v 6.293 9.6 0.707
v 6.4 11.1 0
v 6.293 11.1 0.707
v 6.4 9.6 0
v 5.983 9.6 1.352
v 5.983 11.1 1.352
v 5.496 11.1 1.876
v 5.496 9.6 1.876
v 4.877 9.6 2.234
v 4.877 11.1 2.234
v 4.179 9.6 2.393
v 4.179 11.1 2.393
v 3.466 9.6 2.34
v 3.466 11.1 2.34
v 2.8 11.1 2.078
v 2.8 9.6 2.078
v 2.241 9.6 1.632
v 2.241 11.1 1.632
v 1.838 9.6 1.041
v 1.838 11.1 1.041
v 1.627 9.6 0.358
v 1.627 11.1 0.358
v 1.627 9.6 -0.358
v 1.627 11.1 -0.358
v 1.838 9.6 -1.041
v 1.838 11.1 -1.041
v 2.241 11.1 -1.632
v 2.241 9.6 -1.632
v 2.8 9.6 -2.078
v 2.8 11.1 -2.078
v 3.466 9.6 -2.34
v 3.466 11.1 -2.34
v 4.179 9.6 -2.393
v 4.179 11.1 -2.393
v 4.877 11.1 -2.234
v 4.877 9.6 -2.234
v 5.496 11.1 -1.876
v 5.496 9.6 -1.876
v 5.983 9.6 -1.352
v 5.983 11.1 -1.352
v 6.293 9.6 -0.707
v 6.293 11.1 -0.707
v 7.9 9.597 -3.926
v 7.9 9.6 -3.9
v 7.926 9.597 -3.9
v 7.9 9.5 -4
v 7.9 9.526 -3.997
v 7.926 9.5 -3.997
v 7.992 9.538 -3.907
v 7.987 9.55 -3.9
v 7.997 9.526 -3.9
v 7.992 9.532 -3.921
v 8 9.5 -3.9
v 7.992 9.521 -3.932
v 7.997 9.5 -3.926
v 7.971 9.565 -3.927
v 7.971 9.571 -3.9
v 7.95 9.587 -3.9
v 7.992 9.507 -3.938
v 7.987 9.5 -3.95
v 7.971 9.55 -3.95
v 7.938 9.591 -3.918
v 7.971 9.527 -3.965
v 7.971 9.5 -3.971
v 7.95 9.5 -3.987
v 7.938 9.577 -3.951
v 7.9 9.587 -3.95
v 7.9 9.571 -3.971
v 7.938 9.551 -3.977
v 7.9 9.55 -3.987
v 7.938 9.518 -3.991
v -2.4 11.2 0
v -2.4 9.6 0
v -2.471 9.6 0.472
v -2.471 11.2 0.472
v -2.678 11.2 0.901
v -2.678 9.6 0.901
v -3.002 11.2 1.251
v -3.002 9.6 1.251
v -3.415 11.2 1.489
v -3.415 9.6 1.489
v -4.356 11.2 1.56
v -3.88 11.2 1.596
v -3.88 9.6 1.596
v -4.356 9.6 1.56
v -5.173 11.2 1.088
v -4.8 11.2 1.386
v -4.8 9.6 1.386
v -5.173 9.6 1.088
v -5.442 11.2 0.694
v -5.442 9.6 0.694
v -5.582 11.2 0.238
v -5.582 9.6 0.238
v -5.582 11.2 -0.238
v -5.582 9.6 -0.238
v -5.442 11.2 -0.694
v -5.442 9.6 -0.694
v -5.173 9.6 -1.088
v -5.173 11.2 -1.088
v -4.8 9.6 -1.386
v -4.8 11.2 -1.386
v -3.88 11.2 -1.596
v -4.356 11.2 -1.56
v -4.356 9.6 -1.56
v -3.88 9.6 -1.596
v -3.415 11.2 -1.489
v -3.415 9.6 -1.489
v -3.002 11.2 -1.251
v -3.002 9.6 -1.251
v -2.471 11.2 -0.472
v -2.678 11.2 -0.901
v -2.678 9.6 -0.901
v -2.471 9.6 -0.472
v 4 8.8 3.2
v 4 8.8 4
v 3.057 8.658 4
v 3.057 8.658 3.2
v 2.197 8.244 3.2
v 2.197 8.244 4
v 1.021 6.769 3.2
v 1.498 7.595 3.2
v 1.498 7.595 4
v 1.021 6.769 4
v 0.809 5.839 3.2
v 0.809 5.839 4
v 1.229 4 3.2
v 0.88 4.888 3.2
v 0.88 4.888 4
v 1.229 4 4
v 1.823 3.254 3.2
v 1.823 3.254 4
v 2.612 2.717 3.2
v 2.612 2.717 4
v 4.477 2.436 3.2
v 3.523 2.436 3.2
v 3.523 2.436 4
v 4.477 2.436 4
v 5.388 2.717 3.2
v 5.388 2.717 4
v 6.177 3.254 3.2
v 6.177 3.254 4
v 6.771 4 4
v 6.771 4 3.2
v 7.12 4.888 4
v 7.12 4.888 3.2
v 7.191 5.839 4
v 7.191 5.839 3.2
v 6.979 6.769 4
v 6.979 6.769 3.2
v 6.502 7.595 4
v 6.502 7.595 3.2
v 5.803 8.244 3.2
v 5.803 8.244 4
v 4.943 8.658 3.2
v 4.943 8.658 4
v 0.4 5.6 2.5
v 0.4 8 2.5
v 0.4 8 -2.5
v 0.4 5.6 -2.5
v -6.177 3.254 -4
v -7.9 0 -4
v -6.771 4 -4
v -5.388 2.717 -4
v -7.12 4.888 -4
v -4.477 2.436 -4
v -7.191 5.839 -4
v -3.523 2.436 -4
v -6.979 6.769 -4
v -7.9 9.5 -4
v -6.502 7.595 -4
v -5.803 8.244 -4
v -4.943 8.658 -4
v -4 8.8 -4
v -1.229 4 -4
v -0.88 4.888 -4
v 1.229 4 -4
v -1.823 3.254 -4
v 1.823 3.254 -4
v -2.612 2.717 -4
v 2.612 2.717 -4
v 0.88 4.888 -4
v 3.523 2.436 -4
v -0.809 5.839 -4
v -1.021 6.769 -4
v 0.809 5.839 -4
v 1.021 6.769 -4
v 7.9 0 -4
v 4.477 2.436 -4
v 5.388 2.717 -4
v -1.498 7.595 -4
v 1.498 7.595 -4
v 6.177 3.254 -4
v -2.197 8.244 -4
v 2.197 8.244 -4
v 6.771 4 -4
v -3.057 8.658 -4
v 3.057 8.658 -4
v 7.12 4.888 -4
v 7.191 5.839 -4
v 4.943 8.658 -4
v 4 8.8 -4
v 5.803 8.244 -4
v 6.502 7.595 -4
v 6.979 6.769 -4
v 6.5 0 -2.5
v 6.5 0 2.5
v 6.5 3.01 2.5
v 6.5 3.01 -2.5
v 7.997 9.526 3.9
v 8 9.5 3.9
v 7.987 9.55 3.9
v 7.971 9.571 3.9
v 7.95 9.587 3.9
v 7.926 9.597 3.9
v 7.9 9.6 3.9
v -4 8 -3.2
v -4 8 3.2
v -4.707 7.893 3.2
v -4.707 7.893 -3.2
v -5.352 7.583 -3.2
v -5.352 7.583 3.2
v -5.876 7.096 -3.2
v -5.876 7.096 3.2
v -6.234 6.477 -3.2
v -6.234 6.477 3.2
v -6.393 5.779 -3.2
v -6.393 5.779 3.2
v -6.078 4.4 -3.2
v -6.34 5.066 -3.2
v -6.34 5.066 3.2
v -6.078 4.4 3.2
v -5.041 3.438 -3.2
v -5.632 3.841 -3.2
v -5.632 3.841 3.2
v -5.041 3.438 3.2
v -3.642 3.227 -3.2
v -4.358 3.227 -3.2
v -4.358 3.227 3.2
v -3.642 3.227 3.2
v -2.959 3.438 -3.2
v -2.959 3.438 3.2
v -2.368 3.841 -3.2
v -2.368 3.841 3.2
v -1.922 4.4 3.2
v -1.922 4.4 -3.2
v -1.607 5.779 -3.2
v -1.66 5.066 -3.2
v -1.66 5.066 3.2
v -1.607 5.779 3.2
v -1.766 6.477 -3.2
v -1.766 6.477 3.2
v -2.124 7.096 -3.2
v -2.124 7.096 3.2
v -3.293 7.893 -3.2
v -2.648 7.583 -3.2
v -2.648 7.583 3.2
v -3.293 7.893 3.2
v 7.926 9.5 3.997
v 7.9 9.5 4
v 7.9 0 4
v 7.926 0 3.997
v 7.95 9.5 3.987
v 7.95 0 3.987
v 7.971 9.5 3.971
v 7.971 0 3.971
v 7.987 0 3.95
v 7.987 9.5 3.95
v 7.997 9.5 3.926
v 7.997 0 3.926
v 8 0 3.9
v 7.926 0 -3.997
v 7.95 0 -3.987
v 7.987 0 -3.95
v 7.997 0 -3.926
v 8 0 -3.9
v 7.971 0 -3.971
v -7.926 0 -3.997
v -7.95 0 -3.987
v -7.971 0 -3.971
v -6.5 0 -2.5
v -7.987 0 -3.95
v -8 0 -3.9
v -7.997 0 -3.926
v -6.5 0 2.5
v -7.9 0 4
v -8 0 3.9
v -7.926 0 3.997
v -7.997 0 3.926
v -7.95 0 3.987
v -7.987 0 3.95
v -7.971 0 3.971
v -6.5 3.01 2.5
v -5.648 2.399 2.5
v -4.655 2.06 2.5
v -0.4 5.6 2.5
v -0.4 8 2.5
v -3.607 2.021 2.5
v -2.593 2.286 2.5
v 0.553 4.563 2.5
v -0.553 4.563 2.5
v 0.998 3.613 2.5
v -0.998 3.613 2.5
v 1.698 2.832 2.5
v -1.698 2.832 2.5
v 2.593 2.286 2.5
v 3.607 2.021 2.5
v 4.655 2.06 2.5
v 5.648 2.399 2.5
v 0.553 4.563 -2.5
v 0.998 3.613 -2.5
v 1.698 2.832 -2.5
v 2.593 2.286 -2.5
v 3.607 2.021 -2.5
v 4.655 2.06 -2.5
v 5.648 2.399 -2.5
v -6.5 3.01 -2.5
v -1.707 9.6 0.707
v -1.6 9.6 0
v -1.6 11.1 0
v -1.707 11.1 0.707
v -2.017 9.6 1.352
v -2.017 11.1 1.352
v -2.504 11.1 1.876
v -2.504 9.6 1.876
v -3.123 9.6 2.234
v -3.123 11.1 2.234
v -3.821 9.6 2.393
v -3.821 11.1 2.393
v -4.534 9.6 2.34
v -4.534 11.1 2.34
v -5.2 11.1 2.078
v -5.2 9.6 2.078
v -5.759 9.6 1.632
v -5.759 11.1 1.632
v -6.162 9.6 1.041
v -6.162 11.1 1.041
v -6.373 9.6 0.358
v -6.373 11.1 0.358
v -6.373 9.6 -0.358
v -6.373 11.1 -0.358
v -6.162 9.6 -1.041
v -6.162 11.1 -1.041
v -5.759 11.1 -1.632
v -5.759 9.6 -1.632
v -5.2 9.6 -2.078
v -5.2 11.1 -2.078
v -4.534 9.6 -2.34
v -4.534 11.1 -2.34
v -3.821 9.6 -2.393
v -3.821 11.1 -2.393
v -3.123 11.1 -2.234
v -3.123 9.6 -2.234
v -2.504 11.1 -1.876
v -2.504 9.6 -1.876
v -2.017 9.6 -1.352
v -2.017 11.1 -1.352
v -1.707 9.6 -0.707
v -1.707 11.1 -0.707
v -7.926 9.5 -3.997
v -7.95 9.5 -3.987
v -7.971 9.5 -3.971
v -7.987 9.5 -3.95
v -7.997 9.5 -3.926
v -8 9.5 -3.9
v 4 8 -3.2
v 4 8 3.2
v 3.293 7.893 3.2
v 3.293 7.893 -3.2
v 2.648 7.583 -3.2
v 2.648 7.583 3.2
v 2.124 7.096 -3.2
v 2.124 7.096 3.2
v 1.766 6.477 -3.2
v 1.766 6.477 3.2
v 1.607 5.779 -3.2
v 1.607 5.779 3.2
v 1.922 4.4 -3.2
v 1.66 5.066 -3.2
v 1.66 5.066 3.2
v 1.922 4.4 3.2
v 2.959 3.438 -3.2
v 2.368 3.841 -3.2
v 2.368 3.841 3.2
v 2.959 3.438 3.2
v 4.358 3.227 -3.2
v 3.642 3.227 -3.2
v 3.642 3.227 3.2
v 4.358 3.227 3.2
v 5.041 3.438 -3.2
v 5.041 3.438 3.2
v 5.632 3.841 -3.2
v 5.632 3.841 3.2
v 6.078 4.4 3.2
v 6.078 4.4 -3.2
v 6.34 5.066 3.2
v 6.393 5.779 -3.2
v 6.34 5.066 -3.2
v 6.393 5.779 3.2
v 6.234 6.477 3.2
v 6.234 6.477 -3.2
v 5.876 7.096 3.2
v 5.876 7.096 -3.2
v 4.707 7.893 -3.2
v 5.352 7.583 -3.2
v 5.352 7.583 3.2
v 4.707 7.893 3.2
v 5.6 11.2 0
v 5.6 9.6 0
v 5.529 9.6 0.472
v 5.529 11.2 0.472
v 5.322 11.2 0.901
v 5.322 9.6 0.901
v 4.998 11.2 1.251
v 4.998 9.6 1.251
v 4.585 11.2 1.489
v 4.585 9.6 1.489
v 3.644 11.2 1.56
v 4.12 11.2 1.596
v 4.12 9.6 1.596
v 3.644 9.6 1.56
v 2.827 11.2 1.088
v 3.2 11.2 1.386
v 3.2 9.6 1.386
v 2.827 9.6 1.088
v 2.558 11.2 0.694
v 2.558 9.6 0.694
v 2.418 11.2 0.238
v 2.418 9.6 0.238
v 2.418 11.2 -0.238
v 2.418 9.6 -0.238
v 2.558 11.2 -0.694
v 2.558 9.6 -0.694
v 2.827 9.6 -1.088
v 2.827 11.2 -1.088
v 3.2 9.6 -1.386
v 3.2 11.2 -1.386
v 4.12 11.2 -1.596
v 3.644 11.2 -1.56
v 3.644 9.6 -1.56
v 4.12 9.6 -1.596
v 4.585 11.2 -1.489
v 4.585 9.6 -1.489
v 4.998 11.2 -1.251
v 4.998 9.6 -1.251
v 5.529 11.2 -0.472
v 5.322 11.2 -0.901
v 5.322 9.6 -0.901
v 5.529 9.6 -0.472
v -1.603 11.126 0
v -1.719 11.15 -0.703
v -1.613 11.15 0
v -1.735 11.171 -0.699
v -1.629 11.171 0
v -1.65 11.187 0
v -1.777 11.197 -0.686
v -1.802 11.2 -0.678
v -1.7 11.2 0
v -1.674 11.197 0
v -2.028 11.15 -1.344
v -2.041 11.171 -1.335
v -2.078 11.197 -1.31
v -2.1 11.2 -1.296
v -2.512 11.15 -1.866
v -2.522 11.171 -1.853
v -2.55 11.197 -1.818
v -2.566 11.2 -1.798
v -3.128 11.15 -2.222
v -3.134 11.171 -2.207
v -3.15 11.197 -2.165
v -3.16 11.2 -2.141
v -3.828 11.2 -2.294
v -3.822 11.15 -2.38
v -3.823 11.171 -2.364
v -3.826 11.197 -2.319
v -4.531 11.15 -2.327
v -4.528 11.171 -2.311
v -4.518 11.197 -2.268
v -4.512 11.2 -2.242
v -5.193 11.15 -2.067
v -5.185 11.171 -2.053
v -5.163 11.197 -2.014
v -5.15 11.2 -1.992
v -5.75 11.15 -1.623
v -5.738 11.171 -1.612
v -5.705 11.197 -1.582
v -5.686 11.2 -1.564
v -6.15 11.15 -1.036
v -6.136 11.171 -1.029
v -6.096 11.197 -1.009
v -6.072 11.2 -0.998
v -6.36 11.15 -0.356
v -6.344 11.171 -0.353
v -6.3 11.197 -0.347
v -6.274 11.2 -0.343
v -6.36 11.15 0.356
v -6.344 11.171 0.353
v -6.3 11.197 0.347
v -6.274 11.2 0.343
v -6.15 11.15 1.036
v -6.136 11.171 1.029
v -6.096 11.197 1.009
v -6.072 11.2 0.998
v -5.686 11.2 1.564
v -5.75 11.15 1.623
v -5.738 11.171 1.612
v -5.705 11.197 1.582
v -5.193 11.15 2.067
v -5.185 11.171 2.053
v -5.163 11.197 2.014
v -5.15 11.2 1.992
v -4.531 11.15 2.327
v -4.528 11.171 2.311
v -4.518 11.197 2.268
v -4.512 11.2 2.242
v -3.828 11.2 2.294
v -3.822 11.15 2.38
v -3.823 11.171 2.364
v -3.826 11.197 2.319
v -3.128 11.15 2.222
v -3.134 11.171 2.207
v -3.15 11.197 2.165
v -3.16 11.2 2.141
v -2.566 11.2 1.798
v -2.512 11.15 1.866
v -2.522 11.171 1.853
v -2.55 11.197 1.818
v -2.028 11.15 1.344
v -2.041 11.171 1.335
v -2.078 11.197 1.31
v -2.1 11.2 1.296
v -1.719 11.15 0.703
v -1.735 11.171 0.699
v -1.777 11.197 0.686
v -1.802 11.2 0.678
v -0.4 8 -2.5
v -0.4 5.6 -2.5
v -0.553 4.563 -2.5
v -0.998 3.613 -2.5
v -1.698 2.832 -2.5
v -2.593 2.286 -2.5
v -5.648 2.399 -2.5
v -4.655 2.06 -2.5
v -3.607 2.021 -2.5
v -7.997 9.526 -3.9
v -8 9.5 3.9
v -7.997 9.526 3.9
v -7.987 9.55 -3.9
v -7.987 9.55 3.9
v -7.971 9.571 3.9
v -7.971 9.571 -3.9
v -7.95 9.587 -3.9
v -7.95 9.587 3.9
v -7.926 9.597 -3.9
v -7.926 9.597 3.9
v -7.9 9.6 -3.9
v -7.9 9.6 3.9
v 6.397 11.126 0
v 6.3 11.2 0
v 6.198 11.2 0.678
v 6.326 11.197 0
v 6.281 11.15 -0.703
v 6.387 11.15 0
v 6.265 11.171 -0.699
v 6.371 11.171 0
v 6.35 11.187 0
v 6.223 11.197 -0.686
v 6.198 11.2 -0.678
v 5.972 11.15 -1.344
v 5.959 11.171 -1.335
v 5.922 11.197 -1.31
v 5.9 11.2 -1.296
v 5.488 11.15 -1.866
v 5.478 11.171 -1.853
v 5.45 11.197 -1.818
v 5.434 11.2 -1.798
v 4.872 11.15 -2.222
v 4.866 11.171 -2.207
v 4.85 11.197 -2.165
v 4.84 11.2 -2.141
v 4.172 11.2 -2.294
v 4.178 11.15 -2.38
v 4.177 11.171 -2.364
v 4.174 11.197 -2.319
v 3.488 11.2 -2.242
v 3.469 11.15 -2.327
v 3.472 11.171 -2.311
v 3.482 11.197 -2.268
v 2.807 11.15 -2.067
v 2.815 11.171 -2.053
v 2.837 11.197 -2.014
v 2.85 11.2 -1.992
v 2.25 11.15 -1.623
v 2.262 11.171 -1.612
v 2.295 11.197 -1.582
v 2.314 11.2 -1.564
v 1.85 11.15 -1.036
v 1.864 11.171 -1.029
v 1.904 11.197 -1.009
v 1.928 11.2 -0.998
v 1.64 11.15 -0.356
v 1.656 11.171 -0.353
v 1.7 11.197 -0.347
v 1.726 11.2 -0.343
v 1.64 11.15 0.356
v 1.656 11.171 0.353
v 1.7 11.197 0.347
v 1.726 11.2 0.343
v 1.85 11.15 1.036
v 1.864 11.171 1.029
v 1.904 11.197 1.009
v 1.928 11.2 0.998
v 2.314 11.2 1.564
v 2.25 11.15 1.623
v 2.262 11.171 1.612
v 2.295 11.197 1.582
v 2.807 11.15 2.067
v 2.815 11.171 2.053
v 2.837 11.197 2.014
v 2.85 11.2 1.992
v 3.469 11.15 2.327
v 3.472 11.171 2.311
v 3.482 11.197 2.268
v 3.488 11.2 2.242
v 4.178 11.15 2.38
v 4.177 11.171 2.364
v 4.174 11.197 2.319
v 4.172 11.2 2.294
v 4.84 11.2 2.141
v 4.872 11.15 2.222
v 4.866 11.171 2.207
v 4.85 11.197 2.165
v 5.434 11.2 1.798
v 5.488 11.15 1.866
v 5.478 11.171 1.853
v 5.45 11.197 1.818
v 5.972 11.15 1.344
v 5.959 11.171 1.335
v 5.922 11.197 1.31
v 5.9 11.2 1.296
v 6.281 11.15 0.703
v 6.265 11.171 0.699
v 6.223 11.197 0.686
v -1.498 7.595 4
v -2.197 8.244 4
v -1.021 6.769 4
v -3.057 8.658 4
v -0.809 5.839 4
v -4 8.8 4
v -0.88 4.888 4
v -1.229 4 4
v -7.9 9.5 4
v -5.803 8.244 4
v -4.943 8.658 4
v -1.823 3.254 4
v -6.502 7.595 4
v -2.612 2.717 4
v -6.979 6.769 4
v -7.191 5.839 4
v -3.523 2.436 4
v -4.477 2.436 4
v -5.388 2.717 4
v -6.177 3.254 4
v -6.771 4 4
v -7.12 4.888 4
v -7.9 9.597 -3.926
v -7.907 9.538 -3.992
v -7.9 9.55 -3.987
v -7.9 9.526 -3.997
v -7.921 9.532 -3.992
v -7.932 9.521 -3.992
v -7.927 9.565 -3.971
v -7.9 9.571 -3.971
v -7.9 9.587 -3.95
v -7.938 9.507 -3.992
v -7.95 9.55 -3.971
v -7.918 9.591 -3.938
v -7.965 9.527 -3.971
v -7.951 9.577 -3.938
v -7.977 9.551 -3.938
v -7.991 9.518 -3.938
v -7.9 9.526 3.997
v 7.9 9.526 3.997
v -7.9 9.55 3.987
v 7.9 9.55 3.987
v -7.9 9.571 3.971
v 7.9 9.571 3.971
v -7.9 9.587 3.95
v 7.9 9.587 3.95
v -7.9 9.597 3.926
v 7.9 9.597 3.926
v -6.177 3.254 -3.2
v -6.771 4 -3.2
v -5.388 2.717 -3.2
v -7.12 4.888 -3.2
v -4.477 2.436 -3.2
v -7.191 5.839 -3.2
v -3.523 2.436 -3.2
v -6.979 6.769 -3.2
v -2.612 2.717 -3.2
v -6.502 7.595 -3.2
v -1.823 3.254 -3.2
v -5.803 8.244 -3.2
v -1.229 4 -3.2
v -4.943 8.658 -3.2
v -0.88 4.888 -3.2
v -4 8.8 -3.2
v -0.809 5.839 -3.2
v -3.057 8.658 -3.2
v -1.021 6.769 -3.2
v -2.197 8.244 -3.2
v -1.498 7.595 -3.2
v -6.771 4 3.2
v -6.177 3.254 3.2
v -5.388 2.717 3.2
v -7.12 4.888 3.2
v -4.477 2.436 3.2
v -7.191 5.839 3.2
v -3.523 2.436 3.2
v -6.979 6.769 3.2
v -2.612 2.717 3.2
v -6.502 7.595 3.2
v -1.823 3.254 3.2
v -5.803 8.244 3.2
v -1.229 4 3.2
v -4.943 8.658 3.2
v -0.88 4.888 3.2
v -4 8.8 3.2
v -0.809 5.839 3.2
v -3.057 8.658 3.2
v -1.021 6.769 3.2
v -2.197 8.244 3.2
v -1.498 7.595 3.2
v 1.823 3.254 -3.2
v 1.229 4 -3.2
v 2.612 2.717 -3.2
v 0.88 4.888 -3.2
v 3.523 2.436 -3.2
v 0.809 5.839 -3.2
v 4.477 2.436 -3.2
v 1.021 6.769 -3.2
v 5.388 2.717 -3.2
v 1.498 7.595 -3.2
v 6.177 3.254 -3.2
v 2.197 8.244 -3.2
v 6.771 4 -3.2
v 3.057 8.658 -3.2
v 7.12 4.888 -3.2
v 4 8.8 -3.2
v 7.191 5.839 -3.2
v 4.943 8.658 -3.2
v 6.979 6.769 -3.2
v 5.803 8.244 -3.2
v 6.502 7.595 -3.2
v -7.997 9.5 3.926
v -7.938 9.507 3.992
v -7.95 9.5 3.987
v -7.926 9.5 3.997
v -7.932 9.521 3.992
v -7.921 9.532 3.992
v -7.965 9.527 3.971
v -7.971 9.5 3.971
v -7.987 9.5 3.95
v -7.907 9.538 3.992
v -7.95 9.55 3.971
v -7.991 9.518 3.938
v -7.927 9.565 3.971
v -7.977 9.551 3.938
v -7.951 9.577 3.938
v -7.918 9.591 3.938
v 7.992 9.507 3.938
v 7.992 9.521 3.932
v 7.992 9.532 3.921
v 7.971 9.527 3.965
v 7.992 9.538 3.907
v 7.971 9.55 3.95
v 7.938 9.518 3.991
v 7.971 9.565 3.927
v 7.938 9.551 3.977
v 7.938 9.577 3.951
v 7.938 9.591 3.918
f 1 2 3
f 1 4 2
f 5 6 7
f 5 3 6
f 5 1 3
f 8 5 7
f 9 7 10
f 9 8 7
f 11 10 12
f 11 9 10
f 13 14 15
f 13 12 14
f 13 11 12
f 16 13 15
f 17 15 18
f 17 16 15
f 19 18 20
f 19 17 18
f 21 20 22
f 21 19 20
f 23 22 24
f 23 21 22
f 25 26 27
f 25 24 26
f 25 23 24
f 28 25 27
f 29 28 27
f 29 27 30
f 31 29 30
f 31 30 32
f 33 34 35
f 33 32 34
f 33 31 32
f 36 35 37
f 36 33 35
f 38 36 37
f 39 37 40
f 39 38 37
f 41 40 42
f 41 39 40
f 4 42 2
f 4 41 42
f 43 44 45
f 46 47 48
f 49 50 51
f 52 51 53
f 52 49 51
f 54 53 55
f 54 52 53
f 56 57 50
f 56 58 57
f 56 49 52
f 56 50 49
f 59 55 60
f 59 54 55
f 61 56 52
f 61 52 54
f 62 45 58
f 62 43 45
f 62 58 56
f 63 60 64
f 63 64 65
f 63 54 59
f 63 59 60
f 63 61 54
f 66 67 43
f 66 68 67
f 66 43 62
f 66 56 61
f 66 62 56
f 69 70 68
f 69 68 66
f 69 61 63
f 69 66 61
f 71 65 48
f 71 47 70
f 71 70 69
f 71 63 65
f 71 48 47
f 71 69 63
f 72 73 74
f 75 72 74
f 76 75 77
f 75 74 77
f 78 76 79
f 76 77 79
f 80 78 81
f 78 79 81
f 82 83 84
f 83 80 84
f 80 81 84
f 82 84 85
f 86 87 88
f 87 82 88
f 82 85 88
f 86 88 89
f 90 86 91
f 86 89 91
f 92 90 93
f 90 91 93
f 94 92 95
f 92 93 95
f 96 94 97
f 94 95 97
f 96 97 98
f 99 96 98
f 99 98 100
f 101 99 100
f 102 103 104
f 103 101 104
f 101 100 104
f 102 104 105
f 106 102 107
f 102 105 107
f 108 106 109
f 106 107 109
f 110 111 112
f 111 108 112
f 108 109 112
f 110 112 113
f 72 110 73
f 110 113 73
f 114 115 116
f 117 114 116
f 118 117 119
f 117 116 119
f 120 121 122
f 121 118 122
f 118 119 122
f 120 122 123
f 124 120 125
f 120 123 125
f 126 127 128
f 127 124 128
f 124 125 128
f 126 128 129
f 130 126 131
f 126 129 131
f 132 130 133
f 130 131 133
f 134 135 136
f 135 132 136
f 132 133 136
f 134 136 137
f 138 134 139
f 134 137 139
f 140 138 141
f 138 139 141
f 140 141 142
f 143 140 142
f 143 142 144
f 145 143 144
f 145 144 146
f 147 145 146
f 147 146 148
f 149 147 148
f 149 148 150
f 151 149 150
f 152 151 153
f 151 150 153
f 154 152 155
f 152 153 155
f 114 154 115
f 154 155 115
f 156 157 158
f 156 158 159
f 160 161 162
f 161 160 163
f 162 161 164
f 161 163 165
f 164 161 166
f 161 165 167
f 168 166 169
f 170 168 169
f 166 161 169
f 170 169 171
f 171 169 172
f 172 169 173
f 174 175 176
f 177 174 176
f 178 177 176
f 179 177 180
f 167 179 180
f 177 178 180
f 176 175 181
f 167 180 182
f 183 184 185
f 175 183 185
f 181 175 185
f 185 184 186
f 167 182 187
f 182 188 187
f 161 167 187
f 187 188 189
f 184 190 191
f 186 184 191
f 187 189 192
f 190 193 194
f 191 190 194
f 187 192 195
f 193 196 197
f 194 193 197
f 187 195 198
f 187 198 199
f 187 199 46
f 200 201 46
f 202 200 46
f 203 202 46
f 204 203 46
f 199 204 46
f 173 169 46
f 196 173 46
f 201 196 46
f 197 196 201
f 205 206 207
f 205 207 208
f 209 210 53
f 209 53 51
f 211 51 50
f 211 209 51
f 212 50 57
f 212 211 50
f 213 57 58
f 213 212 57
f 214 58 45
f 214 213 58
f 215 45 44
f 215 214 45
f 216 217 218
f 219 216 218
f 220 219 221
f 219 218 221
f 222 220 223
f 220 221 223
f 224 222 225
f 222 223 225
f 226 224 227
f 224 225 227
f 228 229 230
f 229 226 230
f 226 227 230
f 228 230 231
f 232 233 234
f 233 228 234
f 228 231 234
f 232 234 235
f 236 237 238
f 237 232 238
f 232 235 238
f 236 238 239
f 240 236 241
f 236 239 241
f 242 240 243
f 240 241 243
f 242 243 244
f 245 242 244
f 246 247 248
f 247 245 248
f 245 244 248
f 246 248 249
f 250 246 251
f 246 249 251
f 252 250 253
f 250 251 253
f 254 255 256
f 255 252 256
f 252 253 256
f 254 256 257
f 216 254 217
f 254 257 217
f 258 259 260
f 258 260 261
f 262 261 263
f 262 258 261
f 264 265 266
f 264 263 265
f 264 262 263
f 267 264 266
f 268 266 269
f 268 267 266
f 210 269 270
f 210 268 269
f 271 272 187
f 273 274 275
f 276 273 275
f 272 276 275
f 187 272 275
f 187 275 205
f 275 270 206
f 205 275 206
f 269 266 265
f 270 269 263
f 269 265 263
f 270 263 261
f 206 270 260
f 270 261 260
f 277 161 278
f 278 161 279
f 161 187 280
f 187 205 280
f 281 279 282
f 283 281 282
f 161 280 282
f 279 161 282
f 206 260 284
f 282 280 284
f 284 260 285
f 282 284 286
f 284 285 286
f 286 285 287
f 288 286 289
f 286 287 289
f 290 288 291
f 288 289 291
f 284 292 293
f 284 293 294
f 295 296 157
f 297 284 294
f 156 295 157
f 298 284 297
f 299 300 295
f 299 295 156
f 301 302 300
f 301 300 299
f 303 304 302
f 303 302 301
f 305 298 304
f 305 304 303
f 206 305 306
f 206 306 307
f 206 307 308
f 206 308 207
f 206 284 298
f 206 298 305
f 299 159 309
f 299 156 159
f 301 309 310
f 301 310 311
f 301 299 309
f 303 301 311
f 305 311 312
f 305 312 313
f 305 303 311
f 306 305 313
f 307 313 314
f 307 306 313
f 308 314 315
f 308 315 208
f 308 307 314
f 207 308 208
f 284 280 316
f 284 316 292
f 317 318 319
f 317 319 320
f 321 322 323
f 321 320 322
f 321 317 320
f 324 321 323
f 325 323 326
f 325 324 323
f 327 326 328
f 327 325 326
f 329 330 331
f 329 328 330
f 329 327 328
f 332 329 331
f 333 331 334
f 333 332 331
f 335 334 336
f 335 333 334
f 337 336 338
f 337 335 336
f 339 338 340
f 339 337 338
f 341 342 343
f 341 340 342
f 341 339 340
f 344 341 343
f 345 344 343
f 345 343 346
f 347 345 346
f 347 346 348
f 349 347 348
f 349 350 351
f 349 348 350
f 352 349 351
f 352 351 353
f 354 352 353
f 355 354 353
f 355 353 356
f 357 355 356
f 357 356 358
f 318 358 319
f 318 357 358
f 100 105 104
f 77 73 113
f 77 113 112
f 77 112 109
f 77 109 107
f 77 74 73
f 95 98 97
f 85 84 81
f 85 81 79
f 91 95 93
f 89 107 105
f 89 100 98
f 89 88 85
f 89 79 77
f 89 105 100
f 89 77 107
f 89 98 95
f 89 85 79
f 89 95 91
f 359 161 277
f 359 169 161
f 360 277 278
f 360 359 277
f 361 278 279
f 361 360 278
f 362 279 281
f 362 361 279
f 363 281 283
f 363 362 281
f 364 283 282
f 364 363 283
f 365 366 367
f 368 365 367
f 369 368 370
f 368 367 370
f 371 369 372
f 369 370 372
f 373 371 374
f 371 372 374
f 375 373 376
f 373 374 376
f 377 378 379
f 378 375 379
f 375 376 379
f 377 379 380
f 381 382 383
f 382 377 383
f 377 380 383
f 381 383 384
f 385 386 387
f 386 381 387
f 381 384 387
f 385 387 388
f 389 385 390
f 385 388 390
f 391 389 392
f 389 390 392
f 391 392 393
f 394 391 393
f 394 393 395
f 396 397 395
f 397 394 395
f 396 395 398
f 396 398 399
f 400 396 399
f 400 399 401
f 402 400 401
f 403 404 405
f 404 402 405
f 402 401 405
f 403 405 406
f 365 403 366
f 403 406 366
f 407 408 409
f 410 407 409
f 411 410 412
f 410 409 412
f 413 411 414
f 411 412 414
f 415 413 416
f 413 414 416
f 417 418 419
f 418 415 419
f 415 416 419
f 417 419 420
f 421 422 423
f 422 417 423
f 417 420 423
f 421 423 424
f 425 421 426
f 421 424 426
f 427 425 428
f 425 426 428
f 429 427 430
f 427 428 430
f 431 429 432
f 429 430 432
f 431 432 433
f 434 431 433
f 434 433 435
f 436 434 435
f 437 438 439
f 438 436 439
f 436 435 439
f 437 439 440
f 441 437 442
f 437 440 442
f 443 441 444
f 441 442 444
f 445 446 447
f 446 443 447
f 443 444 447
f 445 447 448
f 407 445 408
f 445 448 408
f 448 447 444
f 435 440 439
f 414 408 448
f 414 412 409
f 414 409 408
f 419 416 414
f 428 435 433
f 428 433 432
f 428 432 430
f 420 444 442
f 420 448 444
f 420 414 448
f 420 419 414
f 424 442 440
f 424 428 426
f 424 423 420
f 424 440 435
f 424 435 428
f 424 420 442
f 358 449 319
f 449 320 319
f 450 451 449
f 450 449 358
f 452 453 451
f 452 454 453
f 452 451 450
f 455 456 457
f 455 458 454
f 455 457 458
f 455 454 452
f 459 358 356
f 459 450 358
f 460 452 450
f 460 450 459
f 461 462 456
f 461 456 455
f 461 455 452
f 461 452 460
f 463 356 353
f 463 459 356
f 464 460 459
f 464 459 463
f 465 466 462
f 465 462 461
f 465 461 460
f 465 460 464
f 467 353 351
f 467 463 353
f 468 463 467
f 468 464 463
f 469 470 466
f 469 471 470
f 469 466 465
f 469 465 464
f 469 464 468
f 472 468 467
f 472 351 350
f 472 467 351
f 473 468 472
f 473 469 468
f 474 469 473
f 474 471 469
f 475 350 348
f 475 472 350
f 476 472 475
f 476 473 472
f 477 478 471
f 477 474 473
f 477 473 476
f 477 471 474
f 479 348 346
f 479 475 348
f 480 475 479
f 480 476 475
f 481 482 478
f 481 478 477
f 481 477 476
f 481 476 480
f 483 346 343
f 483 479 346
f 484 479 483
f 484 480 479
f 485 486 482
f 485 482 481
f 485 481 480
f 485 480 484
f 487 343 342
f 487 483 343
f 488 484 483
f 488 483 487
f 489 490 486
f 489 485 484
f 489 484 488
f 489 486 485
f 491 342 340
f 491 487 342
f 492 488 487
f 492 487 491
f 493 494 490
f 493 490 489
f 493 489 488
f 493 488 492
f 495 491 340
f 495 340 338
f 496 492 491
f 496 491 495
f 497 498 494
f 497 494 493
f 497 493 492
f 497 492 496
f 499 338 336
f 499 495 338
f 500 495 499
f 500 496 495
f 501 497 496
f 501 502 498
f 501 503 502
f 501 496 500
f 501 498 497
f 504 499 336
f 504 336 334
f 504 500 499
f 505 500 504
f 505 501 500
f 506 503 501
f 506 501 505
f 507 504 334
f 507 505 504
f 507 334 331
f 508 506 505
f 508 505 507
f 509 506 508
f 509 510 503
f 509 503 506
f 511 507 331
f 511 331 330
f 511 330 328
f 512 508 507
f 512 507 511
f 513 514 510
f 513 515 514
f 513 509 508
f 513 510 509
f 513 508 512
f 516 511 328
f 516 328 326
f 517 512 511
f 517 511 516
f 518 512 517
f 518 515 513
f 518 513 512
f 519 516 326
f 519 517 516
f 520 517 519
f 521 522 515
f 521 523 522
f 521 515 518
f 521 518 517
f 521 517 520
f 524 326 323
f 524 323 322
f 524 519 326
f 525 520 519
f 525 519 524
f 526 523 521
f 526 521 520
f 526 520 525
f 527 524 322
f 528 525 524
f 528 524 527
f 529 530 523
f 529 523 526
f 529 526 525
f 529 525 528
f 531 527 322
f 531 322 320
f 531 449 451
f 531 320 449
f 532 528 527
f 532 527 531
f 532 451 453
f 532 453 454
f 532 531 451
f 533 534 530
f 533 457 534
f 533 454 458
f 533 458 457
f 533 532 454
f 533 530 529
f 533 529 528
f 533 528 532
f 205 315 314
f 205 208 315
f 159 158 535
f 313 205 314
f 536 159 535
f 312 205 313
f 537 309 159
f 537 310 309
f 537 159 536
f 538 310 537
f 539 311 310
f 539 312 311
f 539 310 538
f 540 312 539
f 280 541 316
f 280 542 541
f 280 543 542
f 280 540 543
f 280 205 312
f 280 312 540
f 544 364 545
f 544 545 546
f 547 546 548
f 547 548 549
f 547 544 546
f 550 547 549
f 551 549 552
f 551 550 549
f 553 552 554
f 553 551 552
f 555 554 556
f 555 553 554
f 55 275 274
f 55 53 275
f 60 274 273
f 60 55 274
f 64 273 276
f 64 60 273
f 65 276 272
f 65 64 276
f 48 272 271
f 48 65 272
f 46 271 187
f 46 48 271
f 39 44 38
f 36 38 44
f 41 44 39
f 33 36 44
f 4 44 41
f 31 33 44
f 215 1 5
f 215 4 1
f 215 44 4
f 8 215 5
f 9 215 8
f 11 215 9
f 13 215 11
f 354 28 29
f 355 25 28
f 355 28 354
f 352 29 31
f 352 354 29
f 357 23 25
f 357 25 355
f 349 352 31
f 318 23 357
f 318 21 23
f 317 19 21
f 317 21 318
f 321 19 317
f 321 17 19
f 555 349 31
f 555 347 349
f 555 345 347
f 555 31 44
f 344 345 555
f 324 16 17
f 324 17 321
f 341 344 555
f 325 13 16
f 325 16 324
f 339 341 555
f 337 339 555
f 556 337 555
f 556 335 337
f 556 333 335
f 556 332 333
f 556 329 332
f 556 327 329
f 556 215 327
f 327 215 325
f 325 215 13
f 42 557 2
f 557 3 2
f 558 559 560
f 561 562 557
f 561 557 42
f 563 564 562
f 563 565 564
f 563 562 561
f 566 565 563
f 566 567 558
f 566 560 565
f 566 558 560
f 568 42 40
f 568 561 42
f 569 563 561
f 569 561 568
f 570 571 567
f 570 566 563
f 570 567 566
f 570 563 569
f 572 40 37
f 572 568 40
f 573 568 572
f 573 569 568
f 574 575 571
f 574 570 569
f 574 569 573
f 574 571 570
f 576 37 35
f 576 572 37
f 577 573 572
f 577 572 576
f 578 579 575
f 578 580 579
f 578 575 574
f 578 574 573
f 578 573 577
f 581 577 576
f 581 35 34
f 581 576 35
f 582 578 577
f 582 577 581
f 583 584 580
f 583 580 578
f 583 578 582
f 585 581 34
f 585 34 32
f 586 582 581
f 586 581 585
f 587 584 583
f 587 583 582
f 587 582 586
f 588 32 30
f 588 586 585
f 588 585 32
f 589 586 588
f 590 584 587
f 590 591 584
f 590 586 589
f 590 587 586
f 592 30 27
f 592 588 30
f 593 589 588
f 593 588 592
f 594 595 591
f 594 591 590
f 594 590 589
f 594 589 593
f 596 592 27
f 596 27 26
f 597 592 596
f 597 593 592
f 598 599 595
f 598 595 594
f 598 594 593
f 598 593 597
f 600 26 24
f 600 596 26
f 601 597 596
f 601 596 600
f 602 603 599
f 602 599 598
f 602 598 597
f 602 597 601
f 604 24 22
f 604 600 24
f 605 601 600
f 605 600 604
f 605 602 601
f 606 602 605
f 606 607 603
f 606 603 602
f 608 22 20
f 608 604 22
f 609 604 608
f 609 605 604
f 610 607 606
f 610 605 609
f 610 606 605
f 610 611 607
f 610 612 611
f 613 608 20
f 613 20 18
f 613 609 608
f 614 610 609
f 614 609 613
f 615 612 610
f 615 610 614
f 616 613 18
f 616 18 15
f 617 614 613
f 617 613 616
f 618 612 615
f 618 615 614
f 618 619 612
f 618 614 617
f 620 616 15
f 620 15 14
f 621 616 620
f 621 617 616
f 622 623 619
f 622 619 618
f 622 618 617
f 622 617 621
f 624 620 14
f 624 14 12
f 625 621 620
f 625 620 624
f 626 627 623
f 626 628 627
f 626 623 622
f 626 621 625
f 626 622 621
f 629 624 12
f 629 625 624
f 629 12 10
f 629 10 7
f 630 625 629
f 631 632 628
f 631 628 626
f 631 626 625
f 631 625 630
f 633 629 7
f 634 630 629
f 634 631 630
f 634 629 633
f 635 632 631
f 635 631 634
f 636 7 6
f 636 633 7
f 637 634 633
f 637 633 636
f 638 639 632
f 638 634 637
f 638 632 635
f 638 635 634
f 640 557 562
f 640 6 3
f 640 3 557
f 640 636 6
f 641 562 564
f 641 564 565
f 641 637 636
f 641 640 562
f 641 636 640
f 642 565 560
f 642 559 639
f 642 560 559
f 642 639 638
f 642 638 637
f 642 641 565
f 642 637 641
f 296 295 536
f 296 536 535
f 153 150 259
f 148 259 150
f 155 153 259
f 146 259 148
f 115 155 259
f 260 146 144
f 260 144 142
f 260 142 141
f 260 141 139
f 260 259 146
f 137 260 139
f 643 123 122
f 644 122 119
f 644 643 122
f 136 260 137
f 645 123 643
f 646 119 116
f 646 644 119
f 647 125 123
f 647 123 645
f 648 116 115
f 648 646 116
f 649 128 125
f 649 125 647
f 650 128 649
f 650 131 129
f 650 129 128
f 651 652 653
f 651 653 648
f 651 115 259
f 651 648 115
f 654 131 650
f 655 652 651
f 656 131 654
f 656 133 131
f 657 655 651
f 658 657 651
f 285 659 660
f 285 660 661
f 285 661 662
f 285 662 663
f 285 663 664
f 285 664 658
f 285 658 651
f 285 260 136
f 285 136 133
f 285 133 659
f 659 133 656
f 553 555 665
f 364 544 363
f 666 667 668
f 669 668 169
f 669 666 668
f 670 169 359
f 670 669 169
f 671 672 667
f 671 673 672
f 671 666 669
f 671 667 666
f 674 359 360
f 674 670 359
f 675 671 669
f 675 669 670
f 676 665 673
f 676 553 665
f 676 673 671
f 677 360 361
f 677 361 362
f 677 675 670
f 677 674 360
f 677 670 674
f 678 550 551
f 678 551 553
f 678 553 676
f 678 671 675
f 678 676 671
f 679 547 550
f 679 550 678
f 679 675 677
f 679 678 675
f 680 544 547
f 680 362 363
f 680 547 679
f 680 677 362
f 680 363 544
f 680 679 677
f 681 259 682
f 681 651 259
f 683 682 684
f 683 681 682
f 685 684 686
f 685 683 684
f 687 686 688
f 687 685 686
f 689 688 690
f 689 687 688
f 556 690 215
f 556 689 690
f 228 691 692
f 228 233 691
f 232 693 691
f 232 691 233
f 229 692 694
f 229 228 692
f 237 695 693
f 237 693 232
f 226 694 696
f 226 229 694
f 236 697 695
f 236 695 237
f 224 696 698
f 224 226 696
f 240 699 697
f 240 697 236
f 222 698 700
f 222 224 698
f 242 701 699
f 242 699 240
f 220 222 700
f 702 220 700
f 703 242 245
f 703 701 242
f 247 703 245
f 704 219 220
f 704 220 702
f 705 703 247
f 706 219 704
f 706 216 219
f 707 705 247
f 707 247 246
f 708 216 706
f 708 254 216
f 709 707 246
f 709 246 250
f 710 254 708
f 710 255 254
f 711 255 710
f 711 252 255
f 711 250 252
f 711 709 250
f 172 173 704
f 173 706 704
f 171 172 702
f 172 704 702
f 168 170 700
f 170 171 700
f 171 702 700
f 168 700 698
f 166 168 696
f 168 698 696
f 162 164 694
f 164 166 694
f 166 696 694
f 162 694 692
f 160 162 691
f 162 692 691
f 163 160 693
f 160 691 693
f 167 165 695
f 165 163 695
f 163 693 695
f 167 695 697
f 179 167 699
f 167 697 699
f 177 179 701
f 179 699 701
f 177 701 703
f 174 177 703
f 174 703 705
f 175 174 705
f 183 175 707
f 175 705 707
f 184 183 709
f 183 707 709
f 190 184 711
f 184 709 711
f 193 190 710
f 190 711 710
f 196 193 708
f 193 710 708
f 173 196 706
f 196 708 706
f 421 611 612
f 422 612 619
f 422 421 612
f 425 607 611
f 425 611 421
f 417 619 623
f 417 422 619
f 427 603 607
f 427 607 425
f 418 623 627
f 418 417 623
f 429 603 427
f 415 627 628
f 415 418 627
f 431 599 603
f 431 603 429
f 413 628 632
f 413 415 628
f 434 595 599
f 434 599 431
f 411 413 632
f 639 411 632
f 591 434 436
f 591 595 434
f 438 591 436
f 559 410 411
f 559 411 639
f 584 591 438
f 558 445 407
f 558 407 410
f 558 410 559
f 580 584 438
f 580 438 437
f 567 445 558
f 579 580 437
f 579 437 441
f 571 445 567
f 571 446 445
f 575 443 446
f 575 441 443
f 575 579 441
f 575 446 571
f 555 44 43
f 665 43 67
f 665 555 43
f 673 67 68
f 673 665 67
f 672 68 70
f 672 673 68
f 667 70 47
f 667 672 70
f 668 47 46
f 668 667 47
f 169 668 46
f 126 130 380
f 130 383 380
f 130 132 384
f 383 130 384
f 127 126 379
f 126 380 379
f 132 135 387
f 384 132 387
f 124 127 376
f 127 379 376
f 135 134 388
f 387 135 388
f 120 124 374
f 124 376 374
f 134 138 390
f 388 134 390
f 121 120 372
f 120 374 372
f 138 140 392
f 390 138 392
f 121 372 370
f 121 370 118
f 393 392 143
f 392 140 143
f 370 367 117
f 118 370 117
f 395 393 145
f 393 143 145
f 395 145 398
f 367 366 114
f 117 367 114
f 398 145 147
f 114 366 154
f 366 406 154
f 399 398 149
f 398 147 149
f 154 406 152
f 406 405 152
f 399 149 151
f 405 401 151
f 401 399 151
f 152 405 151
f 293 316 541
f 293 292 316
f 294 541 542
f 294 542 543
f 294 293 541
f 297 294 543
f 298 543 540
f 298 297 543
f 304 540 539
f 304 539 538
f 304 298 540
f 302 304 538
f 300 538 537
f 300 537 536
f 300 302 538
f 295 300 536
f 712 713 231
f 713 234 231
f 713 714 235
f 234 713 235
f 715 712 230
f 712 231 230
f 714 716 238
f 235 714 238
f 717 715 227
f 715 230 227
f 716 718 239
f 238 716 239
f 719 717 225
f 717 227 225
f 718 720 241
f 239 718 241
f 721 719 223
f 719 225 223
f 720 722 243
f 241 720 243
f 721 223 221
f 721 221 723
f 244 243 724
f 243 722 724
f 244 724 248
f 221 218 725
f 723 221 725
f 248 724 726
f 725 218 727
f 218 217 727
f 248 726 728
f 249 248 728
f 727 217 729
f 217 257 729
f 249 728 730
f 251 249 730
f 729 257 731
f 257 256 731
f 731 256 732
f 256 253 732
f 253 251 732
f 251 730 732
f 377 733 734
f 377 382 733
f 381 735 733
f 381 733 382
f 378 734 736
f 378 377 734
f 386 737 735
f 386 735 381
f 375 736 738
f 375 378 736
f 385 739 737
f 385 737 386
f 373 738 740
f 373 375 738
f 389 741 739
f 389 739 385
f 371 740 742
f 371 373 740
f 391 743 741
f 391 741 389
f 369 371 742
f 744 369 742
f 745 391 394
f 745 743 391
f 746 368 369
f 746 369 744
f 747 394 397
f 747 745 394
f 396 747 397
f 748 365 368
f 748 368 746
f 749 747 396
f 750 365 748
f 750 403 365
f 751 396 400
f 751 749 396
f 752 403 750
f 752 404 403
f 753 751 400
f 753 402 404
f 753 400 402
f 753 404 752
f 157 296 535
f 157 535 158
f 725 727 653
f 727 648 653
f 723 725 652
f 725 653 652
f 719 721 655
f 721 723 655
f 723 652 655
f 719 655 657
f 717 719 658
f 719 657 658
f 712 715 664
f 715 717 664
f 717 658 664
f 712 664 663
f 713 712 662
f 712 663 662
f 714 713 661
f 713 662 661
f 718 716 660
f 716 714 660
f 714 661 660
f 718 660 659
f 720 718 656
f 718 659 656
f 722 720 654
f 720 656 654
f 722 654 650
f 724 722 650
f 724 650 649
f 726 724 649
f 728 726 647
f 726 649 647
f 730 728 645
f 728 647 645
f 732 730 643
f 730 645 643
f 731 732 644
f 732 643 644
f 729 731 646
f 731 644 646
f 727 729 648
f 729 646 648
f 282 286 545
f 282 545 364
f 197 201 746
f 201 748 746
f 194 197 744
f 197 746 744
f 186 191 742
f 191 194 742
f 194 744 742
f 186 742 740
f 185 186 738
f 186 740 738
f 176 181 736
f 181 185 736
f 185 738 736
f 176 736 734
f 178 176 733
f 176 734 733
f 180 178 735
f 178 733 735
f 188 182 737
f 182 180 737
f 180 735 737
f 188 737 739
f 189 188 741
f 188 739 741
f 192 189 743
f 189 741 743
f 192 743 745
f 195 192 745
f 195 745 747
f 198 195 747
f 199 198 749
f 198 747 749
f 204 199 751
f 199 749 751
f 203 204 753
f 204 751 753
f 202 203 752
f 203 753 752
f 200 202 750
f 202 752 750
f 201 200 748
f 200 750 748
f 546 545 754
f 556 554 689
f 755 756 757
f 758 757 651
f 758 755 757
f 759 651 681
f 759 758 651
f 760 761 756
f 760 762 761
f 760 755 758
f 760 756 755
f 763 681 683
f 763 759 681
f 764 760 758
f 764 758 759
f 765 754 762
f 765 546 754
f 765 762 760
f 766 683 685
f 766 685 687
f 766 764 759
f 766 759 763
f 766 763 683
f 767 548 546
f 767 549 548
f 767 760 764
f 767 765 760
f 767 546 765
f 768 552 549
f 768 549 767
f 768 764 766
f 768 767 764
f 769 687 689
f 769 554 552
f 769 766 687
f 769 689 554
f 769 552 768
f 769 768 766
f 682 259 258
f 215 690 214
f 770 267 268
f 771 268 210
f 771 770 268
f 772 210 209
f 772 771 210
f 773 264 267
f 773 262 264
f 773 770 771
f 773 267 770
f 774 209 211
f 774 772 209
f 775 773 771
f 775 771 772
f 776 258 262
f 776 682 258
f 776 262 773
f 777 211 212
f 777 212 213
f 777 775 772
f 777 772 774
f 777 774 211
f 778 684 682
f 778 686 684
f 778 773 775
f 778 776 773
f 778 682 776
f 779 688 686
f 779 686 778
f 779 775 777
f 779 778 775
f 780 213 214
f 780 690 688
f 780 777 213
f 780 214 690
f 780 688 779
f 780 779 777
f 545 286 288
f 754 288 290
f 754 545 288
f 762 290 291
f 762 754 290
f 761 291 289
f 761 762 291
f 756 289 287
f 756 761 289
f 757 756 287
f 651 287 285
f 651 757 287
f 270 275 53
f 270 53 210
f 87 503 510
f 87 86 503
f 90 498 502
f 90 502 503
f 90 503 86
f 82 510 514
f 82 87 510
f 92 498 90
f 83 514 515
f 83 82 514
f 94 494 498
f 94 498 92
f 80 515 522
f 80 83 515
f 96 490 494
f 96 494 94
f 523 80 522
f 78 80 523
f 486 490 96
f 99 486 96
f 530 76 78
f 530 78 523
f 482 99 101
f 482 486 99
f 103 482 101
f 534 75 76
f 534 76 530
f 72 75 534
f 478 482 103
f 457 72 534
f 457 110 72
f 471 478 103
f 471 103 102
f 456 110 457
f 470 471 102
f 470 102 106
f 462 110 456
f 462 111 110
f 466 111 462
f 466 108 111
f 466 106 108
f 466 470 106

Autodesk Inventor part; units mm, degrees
ref_plane "XZ Plane" through (0, 0, 0) normal (0, 1, 0) x (-1, 0, 0)
ref_plane "XY Plane" through (0, 0, 0) normal (0, 0, 1) x (1, 0, 0)
sketch "Sketch2" plane through (0, 0, 0) normal (0, 1, 0) x (-1, 0, 0)
  line L0 (-8, -4) -> (8, -4)
  line L1 (-8, 4) -> (8, 4)
  line L2 (-8, -4) -> (-8, 4)
  line L3 (8, 4) -> (8, -4)
  point P0 (0, 0)
  point P1 (0, 4)
  point P2 (-8, 0)
  dimension "d58" = 16
  dimension "d59" = 8
extrude "Extrusion1" add sketch "Sketch2" along normal blind 9.6
sketch "Sketch9" plane through (0, 0, 0) normal (0, -1, 0) x (1, 0, 0)
  line L0 (-8, 4) -> (8, 4) projected
  line L1 (-8, -4) -> (-8, 4) projected
  line L2 (-6.5, 2.5) -> (6.5, 2.5)
  line L3 (6.5, 2.5) -> (6.5, -2.5)
  line L4 (6.5, -2.5) -> (-6.5, -2.5)
  line L5 (-6.5, -2.5) -> (-6.5, 2.5)
  point P0 (0, 0)
  point P1 (0, 2.5)
  point P2 (-6.5, 0)
  dimension "d61" = 1.5
  dimension "d62" = 1.5
extrude "Extrusion4" cut sketch "Sketch9" against normal blind 8
sketch "Sketch11" plane through (-8, 0, 4) normal (0, 0, 1) x (1, 0, 0)
  line L0 (0, 0) -> (16, 0) projected
  line L1 (0, 9.6) -> (16, 9.6) projected
  line L2 (0, 0) -> (0, 9.6) projected
  line L3 (7.6, 8) -> (0.4, 8)
  line L4 (0.4, 8) -> (0.4, 5.6)
  arc A0 (0.4, 5.6) -> (7.6, 5.6) centre (4, 5.6) ccw
  line L5 (7.6, 5.6) -> (7.6, 8)
  point P0 (8, 0)
  point P1 (8, 9.6)
  dimension "d93" = 1.6
  dimension "d94" = 4
  dimension "d96" = 7.2
  dimension "d97" = 5.6
extrude "Extrusion5" add sketch "Sketch11" against normal blind 8
sketch "Sketch4" plane through (0, 9.6, 0) normal (0, 1, 0) x (1, 0, 0)
  circle A0 centre (-4, 0) radius 2.4
  circle A1 centre (-4, 0) radius 1.6
  line L0 (-8, 4) -> (-8, -4) projected
  point P0 (-8, 0)
  dimension "d13" = 4.8
  dimension "d57" = 3.2
  dimension "d69" = 4
extrude "Extrusion3" add sketch "Sketch4" along normal blind 1.6
sketch3d "Sketch12"
feature "LEGO_SM:1" [suppressed]
fillet "Fillet1" radius 0.1 1 edges at (-6.4, 11.2, 0)
pattern_linear "Rectangular Pattern2" count 2 spacing 8 along (1, 0, 0) of "Extrusion3", "Fillet1", "Extrusion5"
fillet "Fillet2" radius 0.1 8 edges at (-8, 9.6, 0) (-8, 4.8, 4) (0, 9.6, 4) (-8, 4.8, -4) (0, 9.6, -4) (8, 4.8, 4) (8, 9.6, 0) (8, 4.8, -4)
ref_plane "Work Plane1" through (-4, 0, 0) normal (1, 0, 0) x (0, 1, 0)
sketch "Sketch10" plane through (-4, 0, 0) normal (1, 0, 0) x (0, 1, 0)
  line L0 (0, -3.9) -> (0, 3.9) projected
  line L1 (0, 4) -> (9.5, 4) projected
  line L2 (9.5, -4) -> (0, -4) projected
  line L3 (5.6, 4) -> (5.6, -4)
  line L4 (5.6, -4) -> (8.8, -4)
  line L5 (8.8, -4) -> (8.8, -3.2)
  line L6 (8.8, -3.2) -> (8, -3.2)
  line L7 (8, -3.2) -> (8, 3.2)
  line L8 (8, 3.2) -> (8.8, 3.2)
  line L9 (8.8, 3.2) -> (8.8, 4)
  line L10 (8.8, 4) -> (5.6, 4)
  line L11 (8.8, 4) -> (9.5, 4)
  line L12 (9.5, -4) -> (8.8, -4)
  line L13 (9.5, -4) -> (9.5, 4)
  point P0 (0, 0)
  dimension "d75" = 5.6
  dimension "d76" = 0.8
  dimension "d77" = 4.8
  dimension "d78" = 6.4
revolve "Revolution1" cut sketch "Sketch10" angle 360 about axis through (-4, 5.6, 4) along (0, 0, -1) contours L1 L9 L8 L7 L6 L5 L2 L3
pattern_linear "Rectangular Pattern4" count 2 spacing 8 along (1, 0, 0) of "Revolution1"
equation "\"d58\" = 8 * knobs"
equation "\"d4\" = lh"
equation "\"d62\" = d61"
equation "\"d63\" = bd"
equation "\"d93\" = topthk"
equation "\"d94\" = 0.5 * lu"
equation "\"d96\" = tlad"
equation "\"d97\" = th"
equation "\"d13\" = kd"
equation "\"d57\" = rd"
equation "\"d69\" = 0.5 * lu"
equation "\"d20\" = knobh"
equation "\"d72\" = lu"
equation "\"d75\" = th"
equation "\"d76\" = tsl"
equation "\"d77\" = tpd"
equation "\"d78\" = tsd"
equation "\"d89\" = -0.5 * lu"
equation "\"knobs\" = 2"
equation "\"lh\" = 9.6"
equation "\"bd\" = 8"
equation "\"topthk\" = 1.6"
equation "\"tlad\" = 7.2"
equation "\"th\" = 5.6"
equation "\"kd\" = 4.8"
equation "\"rd\" = 3.2"
equation "\"lu\" = 8"
equation "\"knobh\" = 1.6"
equation "\"tsl\" = 0.8"
equation "\"tpd\" = 4.8"
equation "\"tsd\" = 6.4"
properties part number "32000-Black" material "ABS Plastic"
